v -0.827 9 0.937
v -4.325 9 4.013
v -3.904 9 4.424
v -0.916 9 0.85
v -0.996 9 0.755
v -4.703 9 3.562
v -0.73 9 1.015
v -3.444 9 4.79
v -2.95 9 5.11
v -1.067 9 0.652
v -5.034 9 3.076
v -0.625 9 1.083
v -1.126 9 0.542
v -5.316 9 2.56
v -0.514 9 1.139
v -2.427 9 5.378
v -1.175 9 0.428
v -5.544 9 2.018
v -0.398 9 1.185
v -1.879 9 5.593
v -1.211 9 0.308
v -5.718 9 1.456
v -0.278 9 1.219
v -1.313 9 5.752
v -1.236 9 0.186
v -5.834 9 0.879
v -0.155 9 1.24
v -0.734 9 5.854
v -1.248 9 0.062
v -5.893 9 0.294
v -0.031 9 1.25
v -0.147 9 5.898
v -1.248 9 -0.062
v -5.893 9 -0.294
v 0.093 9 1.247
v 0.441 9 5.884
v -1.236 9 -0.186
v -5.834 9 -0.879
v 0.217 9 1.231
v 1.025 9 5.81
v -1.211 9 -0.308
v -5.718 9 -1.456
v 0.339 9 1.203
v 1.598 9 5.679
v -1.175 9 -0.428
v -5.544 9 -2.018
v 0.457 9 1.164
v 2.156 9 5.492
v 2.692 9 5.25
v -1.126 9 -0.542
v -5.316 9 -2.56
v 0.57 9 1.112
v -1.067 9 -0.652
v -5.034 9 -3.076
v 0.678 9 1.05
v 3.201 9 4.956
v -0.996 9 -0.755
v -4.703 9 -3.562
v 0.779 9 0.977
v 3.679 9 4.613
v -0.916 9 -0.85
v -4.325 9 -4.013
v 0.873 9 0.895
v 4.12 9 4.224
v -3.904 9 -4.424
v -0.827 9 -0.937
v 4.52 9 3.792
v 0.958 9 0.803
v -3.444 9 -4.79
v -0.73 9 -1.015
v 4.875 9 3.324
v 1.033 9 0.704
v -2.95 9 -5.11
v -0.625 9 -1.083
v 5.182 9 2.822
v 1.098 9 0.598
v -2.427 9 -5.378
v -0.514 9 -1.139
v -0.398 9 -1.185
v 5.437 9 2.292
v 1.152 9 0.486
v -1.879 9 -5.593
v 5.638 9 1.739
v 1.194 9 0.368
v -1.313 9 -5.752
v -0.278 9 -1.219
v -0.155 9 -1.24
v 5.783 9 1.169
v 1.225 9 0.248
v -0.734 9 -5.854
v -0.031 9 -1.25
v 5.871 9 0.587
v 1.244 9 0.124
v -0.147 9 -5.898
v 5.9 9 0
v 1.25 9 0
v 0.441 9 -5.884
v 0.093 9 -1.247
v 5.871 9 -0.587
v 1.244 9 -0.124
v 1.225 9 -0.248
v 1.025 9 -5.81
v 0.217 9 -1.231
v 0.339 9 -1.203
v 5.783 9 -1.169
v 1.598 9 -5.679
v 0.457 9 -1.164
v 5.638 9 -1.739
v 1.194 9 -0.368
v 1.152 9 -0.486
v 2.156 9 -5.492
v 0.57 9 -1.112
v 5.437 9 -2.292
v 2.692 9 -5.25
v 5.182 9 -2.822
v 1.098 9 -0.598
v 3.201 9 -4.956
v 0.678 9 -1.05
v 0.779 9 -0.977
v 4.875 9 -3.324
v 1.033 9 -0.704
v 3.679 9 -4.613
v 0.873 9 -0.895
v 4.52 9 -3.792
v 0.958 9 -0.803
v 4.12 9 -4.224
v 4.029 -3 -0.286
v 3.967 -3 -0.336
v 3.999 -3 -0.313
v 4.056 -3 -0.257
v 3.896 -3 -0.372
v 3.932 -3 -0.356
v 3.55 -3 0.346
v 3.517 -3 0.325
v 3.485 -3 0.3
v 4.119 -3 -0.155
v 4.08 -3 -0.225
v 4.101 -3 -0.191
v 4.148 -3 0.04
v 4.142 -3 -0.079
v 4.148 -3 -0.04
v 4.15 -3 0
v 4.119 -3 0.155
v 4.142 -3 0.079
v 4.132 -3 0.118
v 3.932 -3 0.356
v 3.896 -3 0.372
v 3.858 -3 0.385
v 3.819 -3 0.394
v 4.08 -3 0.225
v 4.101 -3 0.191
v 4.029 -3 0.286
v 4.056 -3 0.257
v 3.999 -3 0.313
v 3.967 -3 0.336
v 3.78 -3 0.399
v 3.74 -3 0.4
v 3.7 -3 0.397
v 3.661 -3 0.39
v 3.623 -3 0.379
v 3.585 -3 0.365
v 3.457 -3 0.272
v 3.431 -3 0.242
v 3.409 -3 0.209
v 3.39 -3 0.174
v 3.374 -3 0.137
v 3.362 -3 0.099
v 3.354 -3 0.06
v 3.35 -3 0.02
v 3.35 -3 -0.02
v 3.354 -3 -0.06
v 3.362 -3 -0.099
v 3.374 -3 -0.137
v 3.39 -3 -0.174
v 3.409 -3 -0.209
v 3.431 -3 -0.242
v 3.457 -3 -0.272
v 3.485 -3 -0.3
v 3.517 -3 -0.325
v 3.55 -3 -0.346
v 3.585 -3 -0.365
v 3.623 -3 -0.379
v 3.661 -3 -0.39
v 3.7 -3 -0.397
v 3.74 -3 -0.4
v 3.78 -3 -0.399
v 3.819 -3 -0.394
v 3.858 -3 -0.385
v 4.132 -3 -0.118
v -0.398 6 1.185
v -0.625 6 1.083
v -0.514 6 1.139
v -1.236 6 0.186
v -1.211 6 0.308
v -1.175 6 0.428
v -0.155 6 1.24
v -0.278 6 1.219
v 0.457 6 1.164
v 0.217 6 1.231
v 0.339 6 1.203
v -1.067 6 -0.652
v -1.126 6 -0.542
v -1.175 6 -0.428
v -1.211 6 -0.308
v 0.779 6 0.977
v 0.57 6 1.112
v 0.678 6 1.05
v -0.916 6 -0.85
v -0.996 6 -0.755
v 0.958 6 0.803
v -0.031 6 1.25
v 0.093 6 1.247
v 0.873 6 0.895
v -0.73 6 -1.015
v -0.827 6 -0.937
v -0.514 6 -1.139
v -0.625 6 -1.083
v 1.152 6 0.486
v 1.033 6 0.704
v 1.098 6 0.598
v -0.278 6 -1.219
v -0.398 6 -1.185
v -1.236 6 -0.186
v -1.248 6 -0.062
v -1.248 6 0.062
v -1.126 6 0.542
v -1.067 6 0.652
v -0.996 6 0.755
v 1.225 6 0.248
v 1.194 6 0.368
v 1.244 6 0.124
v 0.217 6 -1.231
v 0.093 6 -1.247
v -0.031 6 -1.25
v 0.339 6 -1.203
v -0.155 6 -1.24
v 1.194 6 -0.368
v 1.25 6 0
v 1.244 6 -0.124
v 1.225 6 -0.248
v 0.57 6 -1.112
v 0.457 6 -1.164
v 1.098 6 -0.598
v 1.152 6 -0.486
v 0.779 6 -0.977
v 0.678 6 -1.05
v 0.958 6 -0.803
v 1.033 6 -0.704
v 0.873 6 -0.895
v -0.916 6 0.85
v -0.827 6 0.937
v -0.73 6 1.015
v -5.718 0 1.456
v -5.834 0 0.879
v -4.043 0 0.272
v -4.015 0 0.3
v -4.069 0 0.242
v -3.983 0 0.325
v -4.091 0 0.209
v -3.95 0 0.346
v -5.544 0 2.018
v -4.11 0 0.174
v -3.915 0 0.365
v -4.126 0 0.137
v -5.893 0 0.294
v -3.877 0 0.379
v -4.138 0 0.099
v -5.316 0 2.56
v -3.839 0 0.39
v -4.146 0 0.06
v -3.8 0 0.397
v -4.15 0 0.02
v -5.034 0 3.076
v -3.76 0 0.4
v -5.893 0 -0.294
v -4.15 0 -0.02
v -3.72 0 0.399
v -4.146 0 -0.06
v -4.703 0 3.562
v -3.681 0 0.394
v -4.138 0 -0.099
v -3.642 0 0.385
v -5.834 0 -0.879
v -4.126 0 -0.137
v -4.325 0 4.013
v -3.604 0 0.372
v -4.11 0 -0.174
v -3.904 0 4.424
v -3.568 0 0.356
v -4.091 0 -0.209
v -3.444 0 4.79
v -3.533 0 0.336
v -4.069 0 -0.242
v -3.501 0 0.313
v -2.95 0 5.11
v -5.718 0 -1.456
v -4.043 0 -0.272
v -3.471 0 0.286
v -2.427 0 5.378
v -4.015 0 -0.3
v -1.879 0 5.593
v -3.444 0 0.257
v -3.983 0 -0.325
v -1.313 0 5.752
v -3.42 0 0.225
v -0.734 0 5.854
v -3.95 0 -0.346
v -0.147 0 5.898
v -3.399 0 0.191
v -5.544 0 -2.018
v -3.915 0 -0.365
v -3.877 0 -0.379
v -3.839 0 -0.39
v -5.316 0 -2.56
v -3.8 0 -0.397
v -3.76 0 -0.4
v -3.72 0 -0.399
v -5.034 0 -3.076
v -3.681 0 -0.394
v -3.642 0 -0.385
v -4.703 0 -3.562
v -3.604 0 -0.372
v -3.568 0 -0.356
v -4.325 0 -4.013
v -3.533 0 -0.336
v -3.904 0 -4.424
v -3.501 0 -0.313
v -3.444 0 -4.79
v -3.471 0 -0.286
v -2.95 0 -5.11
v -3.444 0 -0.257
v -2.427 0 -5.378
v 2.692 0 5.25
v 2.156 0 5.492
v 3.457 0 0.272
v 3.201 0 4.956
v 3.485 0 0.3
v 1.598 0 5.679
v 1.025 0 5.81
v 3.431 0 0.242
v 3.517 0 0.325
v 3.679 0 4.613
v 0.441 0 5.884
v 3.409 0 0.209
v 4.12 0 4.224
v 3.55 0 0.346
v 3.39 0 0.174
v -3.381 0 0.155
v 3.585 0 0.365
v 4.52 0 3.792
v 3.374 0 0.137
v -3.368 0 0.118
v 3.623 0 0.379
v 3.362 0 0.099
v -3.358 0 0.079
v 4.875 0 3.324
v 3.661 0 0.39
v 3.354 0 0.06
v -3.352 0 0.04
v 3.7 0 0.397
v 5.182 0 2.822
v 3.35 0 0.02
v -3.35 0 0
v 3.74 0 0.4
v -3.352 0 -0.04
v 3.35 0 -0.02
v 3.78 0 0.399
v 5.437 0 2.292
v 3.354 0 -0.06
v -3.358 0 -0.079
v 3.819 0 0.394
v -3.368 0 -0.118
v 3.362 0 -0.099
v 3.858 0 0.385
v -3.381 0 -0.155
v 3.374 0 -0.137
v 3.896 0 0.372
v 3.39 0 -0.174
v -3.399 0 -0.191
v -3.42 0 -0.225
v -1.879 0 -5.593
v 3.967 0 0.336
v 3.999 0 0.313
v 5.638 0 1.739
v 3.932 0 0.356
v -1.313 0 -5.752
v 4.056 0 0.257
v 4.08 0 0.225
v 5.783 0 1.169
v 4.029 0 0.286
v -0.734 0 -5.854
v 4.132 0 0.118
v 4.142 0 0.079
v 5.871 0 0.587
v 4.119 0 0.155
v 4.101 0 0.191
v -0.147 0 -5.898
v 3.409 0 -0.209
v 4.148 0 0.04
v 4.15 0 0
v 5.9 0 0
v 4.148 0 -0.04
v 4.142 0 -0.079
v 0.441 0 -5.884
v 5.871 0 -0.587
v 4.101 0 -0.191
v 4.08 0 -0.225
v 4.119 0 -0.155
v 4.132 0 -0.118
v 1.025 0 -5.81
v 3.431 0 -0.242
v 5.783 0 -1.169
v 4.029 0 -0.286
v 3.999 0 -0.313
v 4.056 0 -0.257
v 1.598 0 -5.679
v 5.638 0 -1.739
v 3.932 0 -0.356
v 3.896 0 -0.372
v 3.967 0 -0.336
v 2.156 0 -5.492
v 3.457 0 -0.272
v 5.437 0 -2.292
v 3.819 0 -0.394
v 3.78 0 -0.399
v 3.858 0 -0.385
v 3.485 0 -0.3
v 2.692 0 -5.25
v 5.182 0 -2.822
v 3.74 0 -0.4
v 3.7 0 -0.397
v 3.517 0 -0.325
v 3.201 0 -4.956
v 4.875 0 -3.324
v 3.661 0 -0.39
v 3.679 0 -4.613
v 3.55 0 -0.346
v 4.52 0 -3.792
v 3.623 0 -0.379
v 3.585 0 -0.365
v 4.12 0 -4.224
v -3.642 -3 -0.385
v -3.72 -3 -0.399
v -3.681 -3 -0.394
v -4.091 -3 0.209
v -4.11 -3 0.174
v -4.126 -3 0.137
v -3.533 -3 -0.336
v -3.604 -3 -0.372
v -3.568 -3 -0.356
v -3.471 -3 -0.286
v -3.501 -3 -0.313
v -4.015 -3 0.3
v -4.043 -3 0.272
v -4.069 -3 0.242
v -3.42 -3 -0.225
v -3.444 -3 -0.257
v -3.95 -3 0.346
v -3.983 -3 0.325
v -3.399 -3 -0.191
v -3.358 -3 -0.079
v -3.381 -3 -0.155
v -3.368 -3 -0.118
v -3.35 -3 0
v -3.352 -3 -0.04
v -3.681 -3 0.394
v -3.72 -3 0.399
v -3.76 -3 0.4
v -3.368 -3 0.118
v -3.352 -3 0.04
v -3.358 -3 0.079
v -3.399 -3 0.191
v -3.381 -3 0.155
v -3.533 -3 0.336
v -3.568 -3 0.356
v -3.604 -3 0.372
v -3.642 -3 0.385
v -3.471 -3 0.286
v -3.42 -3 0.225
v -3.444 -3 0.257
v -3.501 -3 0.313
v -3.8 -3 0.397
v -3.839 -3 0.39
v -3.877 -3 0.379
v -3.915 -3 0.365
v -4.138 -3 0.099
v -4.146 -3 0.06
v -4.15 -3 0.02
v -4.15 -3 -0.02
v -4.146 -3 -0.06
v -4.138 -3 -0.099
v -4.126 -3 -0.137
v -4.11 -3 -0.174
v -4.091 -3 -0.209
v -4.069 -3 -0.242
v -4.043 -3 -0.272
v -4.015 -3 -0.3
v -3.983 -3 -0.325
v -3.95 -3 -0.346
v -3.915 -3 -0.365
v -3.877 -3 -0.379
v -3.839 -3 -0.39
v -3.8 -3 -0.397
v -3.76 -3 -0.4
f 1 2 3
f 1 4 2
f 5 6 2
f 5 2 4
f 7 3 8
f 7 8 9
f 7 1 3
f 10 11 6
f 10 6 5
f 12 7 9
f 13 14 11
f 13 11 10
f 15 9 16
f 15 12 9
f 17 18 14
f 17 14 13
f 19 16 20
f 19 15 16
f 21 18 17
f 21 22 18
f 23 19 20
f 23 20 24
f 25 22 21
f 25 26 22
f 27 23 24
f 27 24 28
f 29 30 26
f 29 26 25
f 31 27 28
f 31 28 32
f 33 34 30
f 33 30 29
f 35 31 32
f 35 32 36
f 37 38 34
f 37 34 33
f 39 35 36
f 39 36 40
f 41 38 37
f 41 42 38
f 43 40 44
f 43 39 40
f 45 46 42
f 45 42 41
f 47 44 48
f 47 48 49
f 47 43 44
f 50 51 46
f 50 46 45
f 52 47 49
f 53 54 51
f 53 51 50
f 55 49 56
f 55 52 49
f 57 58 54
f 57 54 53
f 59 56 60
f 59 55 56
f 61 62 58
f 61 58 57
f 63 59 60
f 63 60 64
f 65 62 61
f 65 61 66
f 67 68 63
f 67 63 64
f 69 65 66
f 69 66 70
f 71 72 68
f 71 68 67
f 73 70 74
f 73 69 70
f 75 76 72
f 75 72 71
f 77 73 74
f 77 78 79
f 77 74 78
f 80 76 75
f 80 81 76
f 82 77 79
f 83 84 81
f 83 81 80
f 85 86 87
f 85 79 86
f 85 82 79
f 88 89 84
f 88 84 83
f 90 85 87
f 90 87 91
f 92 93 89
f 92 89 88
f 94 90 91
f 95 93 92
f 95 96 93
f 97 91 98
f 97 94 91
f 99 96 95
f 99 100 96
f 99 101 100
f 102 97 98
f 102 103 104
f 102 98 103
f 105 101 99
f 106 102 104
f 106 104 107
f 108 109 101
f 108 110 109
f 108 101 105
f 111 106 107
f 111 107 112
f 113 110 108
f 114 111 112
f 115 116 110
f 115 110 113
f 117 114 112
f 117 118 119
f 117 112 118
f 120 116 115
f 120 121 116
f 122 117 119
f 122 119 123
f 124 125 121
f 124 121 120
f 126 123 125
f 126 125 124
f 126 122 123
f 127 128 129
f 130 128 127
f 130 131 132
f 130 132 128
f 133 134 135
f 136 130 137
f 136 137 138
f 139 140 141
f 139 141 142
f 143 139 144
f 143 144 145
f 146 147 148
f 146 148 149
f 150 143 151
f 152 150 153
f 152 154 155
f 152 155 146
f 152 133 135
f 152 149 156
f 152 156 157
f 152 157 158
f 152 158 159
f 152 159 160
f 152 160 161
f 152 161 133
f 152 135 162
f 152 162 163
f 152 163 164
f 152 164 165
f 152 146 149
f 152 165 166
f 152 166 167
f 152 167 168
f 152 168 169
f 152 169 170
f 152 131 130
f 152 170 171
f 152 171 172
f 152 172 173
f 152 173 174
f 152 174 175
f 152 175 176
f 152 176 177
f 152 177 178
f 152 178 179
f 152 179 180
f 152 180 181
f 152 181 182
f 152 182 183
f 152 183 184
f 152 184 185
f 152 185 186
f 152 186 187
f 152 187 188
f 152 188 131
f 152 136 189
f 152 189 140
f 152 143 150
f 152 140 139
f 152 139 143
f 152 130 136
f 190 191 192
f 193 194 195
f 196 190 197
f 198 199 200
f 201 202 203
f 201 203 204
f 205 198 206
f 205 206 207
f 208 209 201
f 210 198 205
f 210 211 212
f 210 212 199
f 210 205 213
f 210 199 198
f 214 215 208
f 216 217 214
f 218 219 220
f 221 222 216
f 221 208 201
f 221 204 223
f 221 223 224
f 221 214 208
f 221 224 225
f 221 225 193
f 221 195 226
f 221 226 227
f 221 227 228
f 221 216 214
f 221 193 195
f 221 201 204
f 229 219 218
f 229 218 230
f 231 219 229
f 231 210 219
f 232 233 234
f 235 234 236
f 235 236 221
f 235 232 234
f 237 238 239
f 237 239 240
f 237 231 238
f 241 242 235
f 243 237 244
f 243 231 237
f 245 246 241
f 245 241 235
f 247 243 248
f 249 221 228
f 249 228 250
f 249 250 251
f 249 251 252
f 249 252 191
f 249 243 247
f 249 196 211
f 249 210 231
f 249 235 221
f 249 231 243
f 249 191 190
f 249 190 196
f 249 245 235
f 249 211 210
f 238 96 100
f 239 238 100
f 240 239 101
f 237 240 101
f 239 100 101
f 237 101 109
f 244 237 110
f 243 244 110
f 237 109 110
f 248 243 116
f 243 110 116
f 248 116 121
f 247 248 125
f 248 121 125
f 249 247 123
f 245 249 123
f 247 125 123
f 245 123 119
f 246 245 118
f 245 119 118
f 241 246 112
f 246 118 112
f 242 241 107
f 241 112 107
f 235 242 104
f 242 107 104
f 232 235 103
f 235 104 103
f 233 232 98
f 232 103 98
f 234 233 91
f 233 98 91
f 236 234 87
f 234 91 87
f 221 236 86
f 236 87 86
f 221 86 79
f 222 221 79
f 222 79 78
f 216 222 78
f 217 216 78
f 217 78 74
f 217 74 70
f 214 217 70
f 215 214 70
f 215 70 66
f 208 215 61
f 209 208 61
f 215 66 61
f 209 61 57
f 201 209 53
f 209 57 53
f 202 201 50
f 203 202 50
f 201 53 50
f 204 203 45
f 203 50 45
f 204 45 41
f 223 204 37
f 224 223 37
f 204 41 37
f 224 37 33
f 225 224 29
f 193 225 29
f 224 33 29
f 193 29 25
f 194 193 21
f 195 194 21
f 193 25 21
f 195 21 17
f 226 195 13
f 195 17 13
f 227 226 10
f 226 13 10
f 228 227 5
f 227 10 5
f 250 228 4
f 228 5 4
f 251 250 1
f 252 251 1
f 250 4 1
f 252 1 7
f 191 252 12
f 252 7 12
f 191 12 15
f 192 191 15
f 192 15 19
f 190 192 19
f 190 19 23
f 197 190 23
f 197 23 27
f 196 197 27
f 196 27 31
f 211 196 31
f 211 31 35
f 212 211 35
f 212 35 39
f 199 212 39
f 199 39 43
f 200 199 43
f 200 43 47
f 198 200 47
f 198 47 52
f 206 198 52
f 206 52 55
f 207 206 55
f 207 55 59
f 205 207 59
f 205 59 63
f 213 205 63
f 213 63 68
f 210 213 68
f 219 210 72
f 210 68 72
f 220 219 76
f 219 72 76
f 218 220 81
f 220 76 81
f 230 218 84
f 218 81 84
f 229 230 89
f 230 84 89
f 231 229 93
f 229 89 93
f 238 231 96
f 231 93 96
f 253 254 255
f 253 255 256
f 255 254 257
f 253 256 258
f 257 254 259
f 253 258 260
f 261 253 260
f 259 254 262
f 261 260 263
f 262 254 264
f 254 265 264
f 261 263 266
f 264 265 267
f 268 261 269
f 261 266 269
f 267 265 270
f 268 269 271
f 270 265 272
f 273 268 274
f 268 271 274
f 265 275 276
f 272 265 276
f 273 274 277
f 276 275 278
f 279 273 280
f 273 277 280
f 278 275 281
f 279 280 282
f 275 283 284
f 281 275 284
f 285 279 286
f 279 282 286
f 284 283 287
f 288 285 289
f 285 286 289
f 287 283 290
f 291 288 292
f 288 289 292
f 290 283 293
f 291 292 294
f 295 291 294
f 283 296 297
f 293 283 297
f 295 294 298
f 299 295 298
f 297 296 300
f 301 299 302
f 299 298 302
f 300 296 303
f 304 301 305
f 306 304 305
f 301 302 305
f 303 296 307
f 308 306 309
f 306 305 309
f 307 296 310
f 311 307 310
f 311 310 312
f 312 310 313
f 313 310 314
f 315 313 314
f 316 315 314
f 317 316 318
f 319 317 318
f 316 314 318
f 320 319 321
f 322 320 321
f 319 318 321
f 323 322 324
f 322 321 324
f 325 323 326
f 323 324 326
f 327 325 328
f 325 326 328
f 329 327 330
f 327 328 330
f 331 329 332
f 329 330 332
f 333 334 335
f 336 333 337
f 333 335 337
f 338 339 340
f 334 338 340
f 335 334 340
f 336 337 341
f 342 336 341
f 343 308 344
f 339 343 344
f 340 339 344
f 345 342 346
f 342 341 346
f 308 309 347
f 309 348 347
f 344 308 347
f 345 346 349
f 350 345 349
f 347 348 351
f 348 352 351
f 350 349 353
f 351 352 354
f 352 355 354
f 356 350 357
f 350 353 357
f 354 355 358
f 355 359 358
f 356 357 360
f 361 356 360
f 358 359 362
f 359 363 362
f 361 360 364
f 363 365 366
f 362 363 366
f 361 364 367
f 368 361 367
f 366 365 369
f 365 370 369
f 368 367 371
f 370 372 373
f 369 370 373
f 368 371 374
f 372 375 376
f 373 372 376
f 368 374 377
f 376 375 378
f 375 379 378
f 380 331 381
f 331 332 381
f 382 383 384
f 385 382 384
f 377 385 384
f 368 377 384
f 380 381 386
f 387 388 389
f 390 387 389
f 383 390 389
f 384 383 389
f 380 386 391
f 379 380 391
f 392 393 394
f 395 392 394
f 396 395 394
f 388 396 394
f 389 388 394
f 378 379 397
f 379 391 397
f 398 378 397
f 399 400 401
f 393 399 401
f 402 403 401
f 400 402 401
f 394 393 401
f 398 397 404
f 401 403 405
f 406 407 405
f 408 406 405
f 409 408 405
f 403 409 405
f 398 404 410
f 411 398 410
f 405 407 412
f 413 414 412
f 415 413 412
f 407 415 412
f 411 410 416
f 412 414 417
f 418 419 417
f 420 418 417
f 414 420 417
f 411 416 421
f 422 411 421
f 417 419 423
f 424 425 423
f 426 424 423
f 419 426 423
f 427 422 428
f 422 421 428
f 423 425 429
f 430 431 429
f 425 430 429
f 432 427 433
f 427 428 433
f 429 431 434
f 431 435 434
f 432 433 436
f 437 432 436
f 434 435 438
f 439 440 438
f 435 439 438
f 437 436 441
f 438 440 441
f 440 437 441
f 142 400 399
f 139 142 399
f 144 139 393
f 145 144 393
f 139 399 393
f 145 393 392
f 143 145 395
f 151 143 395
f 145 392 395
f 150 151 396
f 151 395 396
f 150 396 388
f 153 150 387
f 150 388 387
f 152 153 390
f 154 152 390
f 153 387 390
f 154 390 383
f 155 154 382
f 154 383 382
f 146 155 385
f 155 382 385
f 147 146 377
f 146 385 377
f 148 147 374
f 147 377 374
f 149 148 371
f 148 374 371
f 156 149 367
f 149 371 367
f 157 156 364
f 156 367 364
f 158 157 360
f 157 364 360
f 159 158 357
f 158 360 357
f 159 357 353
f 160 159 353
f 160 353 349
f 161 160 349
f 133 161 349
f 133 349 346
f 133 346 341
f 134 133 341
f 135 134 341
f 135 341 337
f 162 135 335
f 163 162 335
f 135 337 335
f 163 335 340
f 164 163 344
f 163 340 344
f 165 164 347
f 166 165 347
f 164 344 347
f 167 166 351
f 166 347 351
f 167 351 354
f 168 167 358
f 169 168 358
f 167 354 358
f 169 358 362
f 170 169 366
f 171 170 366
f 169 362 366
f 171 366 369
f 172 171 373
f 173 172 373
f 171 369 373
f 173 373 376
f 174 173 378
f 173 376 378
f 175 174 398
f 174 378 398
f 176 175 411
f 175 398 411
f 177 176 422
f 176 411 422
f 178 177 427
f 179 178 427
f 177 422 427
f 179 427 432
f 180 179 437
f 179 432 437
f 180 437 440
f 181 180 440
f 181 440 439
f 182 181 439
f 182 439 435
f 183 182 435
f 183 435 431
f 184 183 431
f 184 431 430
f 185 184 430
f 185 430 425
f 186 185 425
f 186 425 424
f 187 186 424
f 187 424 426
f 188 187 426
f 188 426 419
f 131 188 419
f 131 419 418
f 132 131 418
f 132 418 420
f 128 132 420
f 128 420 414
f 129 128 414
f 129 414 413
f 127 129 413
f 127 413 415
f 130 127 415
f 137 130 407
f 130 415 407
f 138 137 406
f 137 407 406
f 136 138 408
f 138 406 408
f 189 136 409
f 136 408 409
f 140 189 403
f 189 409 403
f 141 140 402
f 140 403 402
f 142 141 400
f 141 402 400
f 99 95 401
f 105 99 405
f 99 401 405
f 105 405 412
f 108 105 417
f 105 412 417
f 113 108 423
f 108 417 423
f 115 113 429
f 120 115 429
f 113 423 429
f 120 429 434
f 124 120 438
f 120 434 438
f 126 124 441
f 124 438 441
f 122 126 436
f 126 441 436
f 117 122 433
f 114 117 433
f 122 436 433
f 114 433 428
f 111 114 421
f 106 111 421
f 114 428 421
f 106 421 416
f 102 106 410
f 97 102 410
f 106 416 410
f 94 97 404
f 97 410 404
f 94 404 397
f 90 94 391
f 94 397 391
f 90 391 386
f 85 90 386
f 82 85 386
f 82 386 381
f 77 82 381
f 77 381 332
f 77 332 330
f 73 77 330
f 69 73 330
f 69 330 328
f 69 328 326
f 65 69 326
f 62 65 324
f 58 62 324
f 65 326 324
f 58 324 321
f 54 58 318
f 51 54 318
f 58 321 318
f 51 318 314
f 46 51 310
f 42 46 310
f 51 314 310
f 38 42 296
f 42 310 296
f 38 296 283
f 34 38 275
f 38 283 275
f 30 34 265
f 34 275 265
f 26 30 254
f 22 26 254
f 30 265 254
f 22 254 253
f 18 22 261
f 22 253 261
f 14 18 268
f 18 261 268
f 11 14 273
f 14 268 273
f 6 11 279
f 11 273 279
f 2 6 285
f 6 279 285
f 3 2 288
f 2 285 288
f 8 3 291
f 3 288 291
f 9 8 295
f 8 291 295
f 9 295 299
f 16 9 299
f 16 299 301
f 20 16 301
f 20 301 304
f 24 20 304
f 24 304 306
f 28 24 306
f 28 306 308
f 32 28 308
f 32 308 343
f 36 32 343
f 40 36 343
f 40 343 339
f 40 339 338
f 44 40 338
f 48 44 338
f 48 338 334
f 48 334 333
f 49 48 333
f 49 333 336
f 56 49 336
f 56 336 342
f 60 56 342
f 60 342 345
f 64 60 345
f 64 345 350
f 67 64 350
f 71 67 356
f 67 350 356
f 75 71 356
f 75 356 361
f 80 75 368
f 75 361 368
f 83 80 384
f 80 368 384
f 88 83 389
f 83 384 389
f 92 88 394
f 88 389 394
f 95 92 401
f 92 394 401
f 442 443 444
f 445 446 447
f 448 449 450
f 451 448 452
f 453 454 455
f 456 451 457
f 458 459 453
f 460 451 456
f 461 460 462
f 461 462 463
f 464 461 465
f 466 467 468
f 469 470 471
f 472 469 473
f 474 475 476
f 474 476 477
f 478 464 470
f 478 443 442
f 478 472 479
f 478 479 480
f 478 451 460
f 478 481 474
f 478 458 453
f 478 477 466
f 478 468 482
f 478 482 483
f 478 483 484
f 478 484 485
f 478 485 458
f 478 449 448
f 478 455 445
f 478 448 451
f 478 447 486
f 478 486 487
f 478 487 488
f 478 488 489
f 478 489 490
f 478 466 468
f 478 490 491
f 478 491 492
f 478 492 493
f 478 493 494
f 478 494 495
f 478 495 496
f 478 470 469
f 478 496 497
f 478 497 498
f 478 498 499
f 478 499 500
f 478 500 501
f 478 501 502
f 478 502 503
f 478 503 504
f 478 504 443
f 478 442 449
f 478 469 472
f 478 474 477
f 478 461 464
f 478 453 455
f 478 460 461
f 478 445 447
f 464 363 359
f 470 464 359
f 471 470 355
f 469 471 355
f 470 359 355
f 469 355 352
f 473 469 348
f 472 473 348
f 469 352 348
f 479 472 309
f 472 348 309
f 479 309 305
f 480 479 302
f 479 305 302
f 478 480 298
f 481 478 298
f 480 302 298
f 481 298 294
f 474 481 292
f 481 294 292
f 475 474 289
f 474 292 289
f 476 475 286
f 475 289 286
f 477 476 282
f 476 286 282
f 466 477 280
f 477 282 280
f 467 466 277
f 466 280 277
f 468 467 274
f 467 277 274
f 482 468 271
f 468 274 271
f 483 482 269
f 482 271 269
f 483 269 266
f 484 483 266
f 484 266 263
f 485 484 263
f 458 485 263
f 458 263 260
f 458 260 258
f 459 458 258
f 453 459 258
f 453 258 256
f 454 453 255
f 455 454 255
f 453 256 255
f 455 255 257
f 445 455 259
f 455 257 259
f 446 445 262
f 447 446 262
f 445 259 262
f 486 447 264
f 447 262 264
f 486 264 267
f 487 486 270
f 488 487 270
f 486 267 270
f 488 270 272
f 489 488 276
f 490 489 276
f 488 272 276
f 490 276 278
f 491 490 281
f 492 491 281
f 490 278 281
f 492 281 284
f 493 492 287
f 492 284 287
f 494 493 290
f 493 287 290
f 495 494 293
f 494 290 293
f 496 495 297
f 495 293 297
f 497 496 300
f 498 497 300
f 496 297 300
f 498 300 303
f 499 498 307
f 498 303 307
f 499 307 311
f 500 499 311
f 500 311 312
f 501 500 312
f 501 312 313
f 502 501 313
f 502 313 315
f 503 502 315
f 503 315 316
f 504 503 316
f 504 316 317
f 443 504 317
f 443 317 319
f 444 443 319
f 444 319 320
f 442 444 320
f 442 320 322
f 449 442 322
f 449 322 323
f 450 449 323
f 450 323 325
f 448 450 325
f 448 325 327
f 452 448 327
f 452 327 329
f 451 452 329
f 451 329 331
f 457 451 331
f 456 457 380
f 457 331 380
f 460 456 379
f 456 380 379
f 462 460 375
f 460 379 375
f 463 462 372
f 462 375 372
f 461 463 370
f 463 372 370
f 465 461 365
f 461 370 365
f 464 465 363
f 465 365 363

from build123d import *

# Parameters (mm, degrees)
ESQUISSE1_R             = 5.9
BOSS_EXTRU_1_DEPTH      = 9
ESQUISSE2_R             = 1.25
ENL_V_MAT_EXTRU_1_DEPTH = 3
ESQUISSE3_R             = 0.4
BOSS_EXTRU_2_DEPTH      = 3


with BuildPart() as part:
    # Esquisse1 → Boss.-Extru.1 (new body)
    with BuildSketch(Plane(origin=(0, 0, 0), x_dir=(1, 0, 0), z_dir=(0, 1, 0))):
        Circle(ESQUISSE1_R)
    extrude(amount=BOSS_EXTRU_1_DEPTH)

    # Esquisse2 → Enlèv. mat.-Extru.1 (cut)
    with BuildSketch(Plane(origin=(0, 9, 0), x_dir=(1, 0, 0), z_dir=(0, 1, 0))):
        Circle(ESQUISSE2_R)
    extrude(amount=-ENL_V_MAT_EXTRU_1_DEPTH, mode=Mode.SUBTRACT)

    # Esquisse3 → Boss.-Extru.2 (add)
    with BuildSketch(Plane.XZ):
        with Locations((3.75, 0)):
            Circle(ESQUISSE3_R)
        with Locations((-3.75, 0)):
            Circle(ESQUISSE3_R)
    extrude(amount=BOSS_EXTRU_2_DEPTH)


solid = part.part
